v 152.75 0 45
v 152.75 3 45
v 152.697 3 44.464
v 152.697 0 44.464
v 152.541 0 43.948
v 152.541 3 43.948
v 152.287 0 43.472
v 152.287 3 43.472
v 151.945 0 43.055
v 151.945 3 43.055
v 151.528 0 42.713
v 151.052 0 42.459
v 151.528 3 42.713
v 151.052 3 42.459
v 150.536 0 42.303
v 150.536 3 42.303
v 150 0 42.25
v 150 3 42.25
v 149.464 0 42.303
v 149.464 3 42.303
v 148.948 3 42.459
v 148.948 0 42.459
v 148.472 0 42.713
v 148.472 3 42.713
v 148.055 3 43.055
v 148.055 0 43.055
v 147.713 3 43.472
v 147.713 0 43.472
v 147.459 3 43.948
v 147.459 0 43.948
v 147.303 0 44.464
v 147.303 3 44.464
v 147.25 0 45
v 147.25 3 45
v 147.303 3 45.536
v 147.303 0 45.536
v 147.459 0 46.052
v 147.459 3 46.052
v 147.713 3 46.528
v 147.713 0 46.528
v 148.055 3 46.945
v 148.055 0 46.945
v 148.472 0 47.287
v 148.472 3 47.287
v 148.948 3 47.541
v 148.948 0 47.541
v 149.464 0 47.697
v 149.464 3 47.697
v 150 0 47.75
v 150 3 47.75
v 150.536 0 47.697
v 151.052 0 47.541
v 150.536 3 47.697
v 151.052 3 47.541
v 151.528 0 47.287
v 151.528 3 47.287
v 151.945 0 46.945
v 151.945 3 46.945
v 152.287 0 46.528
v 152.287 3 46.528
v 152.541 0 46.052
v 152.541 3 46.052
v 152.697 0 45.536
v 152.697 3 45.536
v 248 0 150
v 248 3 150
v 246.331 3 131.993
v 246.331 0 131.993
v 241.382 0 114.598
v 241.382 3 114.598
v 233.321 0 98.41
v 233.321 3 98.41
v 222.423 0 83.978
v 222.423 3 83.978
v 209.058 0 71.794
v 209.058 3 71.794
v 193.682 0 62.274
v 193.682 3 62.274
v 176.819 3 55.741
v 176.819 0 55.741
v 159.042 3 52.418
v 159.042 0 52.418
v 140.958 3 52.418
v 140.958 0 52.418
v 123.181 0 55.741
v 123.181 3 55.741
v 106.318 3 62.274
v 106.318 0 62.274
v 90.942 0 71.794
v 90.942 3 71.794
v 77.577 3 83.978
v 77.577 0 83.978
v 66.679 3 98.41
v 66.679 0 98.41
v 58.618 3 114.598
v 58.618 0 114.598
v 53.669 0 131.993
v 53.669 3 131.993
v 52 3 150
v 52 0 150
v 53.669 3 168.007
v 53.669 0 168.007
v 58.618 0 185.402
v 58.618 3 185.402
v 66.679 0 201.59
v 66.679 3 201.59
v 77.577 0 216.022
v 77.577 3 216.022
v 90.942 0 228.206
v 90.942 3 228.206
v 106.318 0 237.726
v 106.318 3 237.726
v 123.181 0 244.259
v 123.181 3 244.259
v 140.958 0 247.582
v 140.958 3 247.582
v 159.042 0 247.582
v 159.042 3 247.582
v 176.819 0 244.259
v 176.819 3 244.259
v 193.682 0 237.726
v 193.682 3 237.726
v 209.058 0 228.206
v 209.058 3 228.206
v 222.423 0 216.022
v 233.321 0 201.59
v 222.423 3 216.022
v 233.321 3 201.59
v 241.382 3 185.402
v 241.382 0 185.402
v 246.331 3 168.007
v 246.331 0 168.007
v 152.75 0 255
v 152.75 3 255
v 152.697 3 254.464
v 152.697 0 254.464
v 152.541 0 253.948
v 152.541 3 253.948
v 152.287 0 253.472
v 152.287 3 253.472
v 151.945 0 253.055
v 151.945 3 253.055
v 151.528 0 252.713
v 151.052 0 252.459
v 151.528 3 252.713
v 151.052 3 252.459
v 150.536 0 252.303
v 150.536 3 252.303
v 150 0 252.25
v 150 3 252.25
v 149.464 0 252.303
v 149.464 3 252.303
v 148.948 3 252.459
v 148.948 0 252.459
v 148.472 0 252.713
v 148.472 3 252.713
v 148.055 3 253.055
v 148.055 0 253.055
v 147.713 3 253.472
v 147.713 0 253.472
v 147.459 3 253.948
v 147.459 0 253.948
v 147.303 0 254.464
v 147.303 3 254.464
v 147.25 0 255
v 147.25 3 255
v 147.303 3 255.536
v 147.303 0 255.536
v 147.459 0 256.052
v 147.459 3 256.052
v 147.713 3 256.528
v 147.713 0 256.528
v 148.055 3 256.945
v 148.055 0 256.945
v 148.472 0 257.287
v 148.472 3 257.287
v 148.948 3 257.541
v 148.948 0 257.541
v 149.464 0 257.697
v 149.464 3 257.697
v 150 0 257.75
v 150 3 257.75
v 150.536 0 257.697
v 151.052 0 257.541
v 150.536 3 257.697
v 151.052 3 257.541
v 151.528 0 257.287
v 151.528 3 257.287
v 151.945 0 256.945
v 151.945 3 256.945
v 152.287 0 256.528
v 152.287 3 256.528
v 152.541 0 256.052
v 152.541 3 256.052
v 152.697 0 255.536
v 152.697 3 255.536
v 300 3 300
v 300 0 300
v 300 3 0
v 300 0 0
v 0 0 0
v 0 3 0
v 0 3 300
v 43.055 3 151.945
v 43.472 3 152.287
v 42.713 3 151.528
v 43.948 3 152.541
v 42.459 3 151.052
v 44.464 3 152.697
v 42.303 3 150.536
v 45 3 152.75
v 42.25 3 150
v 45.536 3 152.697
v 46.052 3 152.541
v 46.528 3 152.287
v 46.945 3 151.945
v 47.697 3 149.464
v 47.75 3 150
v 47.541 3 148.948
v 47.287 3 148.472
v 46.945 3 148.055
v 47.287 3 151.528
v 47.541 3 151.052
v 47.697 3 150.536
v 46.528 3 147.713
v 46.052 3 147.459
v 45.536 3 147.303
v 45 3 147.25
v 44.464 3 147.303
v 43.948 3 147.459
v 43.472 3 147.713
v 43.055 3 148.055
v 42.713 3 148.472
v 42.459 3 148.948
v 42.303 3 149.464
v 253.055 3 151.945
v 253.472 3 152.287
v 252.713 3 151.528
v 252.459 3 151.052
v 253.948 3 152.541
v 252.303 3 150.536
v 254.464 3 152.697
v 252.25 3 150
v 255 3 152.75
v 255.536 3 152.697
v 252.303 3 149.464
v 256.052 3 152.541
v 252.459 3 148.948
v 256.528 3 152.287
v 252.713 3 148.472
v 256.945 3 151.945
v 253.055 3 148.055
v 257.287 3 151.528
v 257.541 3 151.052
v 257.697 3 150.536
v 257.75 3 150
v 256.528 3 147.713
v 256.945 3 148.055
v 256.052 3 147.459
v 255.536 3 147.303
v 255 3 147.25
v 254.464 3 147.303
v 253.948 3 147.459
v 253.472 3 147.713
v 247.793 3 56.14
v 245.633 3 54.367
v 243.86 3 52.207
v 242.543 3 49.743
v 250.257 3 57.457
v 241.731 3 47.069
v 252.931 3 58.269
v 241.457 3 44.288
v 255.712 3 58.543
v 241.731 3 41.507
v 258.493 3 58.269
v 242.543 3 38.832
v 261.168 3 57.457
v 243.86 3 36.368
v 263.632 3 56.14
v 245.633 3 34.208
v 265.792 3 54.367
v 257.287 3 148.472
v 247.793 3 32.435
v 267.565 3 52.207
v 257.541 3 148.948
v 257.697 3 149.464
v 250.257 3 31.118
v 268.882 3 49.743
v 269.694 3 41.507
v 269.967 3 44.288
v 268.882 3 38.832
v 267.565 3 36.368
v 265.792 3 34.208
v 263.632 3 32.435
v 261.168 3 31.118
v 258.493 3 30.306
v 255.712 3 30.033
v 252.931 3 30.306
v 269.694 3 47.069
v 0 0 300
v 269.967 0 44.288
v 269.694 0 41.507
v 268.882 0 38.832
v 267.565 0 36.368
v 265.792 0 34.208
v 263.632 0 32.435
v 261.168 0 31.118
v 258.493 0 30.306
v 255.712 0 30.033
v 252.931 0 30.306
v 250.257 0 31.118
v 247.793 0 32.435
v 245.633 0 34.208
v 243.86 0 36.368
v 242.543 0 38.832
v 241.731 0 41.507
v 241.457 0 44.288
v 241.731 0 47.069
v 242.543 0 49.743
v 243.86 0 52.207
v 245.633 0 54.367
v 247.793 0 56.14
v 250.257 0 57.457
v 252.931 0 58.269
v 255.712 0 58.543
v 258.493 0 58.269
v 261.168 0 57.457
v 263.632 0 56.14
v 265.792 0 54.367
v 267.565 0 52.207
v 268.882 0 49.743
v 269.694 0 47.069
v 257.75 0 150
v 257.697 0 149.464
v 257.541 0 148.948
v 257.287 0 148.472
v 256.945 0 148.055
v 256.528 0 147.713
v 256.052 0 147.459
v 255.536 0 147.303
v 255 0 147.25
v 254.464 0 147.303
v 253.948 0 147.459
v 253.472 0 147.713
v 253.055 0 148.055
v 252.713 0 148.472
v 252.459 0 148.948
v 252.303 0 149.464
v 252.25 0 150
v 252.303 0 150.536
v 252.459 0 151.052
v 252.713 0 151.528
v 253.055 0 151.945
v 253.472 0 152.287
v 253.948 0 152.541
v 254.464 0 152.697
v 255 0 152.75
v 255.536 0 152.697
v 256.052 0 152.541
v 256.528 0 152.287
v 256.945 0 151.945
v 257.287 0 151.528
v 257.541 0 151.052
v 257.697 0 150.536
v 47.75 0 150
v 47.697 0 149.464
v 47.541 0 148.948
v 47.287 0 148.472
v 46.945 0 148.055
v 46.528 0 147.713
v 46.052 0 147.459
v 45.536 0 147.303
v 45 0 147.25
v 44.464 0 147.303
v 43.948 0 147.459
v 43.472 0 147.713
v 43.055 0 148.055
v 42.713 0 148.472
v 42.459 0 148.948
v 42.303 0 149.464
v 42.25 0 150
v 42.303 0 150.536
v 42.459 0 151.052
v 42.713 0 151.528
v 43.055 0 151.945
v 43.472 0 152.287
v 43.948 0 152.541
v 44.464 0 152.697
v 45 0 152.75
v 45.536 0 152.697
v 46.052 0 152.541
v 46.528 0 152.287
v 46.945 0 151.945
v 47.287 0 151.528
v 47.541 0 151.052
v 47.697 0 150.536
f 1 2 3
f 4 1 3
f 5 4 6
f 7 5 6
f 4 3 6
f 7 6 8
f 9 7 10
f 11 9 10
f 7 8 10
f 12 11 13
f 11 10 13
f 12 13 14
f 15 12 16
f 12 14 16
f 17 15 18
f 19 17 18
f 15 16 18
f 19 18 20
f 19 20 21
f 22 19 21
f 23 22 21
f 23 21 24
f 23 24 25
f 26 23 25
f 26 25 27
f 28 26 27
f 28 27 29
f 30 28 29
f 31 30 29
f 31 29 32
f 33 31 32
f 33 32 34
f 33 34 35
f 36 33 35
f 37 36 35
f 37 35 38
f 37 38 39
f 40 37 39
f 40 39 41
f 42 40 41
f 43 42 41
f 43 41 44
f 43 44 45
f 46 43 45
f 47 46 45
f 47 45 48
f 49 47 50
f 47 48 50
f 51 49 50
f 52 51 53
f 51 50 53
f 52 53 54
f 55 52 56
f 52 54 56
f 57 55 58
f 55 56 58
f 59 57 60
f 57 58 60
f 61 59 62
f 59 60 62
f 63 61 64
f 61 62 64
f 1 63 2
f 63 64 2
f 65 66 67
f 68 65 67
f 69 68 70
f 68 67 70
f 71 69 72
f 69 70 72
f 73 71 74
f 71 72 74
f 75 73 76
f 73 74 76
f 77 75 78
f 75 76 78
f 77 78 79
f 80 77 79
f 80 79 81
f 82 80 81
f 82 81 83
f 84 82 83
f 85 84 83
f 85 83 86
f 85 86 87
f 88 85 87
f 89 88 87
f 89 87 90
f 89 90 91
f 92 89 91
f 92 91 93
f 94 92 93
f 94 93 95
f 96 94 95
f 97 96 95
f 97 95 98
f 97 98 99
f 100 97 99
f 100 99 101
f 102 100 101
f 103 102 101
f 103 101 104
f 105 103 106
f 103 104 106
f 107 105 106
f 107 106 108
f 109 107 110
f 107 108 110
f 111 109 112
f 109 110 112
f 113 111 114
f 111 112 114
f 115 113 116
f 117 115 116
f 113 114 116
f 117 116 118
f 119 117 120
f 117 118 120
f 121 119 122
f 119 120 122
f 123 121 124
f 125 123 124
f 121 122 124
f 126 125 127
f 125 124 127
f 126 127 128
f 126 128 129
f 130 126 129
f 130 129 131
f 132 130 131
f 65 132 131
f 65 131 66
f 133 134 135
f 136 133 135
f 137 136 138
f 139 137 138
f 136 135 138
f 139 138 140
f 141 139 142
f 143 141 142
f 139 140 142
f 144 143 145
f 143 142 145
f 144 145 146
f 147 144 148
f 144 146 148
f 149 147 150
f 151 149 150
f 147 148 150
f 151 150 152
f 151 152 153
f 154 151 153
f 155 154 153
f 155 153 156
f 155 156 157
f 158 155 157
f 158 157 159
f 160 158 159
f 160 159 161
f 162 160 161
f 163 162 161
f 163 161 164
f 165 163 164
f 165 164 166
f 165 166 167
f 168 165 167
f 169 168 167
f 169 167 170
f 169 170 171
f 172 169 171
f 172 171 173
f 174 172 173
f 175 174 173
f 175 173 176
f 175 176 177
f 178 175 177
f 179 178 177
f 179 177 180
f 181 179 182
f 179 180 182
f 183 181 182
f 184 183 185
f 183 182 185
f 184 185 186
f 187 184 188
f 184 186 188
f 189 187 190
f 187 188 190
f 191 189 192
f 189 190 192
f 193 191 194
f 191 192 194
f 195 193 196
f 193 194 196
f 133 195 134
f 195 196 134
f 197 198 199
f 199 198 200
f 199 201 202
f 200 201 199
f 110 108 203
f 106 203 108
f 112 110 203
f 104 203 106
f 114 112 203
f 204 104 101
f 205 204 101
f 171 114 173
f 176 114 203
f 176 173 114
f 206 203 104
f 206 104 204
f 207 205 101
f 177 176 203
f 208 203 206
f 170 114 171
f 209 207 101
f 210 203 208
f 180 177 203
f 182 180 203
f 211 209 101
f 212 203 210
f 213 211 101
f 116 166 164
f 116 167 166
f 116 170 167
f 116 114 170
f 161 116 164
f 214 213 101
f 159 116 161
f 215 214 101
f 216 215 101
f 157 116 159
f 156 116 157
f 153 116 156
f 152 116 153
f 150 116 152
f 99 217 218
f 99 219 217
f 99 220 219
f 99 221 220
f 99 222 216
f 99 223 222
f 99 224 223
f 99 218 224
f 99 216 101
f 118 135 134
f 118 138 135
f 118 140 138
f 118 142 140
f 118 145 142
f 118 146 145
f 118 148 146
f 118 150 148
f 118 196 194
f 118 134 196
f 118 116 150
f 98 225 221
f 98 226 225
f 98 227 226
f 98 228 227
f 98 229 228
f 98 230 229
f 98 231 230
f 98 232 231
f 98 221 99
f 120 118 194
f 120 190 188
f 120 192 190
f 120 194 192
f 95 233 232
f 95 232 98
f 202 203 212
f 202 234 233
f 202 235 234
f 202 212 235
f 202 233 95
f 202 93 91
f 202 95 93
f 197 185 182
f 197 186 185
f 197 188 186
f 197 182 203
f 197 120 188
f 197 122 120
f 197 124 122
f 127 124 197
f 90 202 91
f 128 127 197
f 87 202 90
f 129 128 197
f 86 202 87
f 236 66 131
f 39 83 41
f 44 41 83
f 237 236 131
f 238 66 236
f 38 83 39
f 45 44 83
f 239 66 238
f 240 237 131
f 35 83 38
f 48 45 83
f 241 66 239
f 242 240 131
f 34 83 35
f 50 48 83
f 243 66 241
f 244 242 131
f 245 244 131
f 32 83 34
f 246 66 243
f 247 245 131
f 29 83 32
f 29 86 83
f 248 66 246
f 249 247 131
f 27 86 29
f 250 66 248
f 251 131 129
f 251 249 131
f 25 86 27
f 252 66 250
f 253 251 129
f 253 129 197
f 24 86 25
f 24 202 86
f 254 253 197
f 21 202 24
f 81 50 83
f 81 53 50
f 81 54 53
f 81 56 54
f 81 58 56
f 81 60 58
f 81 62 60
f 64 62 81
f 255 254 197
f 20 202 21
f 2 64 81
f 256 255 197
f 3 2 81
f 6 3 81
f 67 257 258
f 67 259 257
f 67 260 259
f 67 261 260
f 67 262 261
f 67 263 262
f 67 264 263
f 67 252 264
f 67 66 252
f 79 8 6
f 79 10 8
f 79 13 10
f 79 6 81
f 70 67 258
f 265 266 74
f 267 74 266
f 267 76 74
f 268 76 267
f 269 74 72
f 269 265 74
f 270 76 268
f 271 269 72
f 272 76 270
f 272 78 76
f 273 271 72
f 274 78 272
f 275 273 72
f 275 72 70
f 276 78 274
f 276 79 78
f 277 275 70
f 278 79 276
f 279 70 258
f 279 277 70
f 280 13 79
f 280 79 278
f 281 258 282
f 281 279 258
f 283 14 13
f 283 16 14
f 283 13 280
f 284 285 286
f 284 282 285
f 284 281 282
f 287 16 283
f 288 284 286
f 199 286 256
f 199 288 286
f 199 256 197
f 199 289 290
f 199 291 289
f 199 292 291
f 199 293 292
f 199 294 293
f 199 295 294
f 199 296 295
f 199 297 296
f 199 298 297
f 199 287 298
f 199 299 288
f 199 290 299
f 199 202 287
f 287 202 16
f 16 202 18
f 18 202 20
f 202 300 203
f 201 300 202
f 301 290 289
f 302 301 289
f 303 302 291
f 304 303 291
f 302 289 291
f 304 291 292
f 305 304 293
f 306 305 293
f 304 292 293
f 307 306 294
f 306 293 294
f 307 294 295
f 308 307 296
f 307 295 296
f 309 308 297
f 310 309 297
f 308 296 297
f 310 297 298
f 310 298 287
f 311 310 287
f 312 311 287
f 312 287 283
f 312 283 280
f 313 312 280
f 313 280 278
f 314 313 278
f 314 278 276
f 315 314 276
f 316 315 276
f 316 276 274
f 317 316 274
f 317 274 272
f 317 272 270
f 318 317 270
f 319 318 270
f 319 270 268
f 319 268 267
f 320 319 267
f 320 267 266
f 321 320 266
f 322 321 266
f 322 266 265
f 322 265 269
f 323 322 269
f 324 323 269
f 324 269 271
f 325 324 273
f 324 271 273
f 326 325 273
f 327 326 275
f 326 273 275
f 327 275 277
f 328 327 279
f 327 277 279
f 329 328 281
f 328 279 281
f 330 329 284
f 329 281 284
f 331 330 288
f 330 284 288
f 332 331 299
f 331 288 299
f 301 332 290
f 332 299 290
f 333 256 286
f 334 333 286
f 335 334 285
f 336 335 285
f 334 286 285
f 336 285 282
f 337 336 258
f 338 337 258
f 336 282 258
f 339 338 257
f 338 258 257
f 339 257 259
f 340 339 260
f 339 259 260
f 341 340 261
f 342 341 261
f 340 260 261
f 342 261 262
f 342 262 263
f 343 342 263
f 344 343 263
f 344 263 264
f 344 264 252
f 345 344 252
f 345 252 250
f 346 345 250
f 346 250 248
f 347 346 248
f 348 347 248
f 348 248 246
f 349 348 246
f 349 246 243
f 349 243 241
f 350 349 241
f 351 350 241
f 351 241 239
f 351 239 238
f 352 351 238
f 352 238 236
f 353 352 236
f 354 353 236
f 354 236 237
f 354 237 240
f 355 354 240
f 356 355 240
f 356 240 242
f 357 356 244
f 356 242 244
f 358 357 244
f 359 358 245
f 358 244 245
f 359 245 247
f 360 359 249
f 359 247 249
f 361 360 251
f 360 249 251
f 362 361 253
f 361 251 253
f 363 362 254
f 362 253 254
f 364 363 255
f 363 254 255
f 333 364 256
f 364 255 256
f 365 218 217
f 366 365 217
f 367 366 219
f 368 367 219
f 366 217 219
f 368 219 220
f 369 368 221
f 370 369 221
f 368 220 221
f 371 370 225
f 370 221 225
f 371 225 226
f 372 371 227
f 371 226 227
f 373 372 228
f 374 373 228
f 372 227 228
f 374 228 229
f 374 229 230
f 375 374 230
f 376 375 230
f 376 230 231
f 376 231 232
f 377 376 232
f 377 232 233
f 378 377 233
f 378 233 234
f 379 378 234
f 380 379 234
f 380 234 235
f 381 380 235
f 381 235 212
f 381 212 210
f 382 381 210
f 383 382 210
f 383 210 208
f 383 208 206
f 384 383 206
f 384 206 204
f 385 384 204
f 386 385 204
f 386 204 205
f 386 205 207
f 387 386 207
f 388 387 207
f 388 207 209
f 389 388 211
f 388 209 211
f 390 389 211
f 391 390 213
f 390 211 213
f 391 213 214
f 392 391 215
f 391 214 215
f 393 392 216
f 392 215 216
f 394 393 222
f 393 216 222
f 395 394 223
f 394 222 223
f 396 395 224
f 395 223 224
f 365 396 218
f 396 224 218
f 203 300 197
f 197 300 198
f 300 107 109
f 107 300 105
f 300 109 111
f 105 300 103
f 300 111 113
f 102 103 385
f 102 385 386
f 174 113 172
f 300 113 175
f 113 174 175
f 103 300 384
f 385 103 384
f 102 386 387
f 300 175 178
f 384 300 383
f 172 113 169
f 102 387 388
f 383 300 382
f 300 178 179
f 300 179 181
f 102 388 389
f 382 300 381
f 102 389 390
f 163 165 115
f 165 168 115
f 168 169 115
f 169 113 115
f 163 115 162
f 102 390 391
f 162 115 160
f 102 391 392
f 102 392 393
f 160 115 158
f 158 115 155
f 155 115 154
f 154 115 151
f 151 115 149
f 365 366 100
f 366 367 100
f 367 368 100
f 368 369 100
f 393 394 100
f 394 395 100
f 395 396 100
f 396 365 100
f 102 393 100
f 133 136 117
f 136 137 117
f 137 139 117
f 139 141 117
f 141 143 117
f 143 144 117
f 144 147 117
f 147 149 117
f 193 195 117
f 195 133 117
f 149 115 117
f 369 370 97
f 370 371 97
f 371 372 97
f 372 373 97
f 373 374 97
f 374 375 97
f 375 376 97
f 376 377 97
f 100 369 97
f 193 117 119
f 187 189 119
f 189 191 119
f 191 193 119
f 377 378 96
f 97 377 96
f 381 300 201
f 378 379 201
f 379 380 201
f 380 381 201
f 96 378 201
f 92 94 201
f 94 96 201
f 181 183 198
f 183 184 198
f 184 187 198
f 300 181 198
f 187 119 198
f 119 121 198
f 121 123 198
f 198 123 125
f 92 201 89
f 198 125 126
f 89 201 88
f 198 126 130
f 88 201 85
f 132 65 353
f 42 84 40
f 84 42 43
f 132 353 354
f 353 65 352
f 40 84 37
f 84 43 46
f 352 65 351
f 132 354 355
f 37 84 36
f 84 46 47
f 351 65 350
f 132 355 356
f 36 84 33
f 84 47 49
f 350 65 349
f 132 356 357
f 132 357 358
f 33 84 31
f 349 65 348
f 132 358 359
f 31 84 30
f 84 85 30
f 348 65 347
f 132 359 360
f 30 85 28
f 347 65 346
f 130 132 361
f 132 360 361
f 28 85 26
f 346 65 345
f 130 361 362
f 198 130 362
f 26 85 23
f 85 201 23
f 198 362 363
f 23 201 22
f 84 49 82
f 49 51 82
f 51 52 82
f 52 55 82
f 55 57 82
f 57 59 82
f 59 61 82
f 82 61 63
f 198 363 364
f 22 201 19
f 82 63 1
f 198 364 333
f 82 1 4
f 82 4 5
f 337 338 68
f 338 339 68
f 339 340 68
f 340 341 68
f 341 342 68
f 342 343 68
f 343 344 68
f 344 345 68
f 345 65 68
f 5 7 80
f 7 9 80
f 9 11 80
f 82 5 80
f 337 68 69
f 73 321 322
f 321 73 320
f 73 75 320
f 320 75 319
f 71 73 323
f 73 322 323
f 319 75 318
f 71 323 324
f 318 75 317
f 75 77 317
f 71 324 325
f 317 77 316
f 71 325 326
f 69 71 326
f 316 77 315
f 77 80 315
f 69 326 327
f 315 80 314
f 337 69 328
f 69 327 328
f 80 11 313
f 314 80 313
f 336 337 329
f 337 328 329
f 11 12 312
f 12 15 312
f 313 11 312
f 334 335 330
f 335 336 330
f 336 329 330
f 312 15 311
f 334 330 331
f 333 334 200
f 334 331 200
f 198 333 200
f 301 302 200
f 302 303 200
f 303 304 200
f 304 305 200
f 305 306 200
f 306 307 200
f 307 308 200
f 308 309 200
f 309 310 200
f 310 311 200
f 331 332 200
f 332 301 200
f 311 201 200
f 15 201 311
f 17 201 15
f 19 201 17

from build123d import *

# Parameters (mm, degrees)
SKETCH1_W           = 300
SKETCH1_H           = 300
BOSS_EXTRUDE1_DEPTH = 3
CUT_EXTRUDE1_REACH  = 5
SKETCH2_R           = 98
SKETCH2_R_2         = 14.255
SKETCH4_R           = 2.75
CUT_EXTRUDE3_DEPTH  = 4


with BuildPart() as part:
    # Sketch1 → Boss-Extrude1 (new body)
    with BuildSketch(Plane(origin=(0, 0, 0), x_dir=(1, 0, 0), z_dir=(0, 1, 0))):
        with Locations((150, -150)):
            Rectangle(SKETCH1_W, SKETCH1_H)
    extrude(amount=BOSS_EXTRUDE1_DEPTH)

    # Sketch2 → Cut-Extrude1 (cut, up to next)
    with BuildSketch(Plane(origin=(0, 3, 0), x_dir=(1, 0, 0), z_dir=(0, 1, 0)), mode=Mode.PRIVATE) as cut_extrude1_sk1:
        with Locations((150, -150)):
            Circle(SKETCH2_R)
    cut_extrude1_tool1 = extrude(cut_extrude1_sk1.sketch, amount=-CUT_EXTRUDE1_REACH, mode=Mode.PRIVATE) & part.part
    add(cut_extrude1_tool1.solids().sort_by_distance((150, 3, 150))[0], mode=Mode.SUBTRACT)
    # Sketch2 → Cut-Extrude1 (cut, up to next)
    with BuildSketch(Plane(origin=(0, 3, 0), x_dir=(1, 0, 0), z_dir=(0, 1, 0)), mode=Mode.PRIVATE) as cut_extrude1_sk2:
        with Locations((255.712463787, -44.287536213)):
            Circle(SKETCH2_R_2)
    cut_extrude1_tool2 = extrude(cut_extrude1_sk2.sketch, amount=-CUT_EXTRUDE1_REACH, mode=Mode.PRIVATE) & part.part
    add(cut_extrude1_tool2.solids().sort_by_distance((255.712464, 3, 44.287536))[0], mode=Mode.SUBTRACT)

    # Sketch4 → Cut-Extrude3 (cut, through all)
    with BuildSketch(Plane(origin=(0, 3, 0), x_dir=(1, 0, 0), z_dir=(0, 1, 0))):
        with Locations((45, -150)):
            Circle(SKETCH4_R)
        with Locations((255, -150)):
            Circle(SKETCH4_R)
        with Locations((150, -255)):
            Circle(SKETCH4_R)
        with Locations((150, -45)):
            Circle(SKETCH4_R)
    extrude(amount=-CUT_EXTRUDE3_DEPTH, mode=Mode.SUBTRACT)


solid = part.part
